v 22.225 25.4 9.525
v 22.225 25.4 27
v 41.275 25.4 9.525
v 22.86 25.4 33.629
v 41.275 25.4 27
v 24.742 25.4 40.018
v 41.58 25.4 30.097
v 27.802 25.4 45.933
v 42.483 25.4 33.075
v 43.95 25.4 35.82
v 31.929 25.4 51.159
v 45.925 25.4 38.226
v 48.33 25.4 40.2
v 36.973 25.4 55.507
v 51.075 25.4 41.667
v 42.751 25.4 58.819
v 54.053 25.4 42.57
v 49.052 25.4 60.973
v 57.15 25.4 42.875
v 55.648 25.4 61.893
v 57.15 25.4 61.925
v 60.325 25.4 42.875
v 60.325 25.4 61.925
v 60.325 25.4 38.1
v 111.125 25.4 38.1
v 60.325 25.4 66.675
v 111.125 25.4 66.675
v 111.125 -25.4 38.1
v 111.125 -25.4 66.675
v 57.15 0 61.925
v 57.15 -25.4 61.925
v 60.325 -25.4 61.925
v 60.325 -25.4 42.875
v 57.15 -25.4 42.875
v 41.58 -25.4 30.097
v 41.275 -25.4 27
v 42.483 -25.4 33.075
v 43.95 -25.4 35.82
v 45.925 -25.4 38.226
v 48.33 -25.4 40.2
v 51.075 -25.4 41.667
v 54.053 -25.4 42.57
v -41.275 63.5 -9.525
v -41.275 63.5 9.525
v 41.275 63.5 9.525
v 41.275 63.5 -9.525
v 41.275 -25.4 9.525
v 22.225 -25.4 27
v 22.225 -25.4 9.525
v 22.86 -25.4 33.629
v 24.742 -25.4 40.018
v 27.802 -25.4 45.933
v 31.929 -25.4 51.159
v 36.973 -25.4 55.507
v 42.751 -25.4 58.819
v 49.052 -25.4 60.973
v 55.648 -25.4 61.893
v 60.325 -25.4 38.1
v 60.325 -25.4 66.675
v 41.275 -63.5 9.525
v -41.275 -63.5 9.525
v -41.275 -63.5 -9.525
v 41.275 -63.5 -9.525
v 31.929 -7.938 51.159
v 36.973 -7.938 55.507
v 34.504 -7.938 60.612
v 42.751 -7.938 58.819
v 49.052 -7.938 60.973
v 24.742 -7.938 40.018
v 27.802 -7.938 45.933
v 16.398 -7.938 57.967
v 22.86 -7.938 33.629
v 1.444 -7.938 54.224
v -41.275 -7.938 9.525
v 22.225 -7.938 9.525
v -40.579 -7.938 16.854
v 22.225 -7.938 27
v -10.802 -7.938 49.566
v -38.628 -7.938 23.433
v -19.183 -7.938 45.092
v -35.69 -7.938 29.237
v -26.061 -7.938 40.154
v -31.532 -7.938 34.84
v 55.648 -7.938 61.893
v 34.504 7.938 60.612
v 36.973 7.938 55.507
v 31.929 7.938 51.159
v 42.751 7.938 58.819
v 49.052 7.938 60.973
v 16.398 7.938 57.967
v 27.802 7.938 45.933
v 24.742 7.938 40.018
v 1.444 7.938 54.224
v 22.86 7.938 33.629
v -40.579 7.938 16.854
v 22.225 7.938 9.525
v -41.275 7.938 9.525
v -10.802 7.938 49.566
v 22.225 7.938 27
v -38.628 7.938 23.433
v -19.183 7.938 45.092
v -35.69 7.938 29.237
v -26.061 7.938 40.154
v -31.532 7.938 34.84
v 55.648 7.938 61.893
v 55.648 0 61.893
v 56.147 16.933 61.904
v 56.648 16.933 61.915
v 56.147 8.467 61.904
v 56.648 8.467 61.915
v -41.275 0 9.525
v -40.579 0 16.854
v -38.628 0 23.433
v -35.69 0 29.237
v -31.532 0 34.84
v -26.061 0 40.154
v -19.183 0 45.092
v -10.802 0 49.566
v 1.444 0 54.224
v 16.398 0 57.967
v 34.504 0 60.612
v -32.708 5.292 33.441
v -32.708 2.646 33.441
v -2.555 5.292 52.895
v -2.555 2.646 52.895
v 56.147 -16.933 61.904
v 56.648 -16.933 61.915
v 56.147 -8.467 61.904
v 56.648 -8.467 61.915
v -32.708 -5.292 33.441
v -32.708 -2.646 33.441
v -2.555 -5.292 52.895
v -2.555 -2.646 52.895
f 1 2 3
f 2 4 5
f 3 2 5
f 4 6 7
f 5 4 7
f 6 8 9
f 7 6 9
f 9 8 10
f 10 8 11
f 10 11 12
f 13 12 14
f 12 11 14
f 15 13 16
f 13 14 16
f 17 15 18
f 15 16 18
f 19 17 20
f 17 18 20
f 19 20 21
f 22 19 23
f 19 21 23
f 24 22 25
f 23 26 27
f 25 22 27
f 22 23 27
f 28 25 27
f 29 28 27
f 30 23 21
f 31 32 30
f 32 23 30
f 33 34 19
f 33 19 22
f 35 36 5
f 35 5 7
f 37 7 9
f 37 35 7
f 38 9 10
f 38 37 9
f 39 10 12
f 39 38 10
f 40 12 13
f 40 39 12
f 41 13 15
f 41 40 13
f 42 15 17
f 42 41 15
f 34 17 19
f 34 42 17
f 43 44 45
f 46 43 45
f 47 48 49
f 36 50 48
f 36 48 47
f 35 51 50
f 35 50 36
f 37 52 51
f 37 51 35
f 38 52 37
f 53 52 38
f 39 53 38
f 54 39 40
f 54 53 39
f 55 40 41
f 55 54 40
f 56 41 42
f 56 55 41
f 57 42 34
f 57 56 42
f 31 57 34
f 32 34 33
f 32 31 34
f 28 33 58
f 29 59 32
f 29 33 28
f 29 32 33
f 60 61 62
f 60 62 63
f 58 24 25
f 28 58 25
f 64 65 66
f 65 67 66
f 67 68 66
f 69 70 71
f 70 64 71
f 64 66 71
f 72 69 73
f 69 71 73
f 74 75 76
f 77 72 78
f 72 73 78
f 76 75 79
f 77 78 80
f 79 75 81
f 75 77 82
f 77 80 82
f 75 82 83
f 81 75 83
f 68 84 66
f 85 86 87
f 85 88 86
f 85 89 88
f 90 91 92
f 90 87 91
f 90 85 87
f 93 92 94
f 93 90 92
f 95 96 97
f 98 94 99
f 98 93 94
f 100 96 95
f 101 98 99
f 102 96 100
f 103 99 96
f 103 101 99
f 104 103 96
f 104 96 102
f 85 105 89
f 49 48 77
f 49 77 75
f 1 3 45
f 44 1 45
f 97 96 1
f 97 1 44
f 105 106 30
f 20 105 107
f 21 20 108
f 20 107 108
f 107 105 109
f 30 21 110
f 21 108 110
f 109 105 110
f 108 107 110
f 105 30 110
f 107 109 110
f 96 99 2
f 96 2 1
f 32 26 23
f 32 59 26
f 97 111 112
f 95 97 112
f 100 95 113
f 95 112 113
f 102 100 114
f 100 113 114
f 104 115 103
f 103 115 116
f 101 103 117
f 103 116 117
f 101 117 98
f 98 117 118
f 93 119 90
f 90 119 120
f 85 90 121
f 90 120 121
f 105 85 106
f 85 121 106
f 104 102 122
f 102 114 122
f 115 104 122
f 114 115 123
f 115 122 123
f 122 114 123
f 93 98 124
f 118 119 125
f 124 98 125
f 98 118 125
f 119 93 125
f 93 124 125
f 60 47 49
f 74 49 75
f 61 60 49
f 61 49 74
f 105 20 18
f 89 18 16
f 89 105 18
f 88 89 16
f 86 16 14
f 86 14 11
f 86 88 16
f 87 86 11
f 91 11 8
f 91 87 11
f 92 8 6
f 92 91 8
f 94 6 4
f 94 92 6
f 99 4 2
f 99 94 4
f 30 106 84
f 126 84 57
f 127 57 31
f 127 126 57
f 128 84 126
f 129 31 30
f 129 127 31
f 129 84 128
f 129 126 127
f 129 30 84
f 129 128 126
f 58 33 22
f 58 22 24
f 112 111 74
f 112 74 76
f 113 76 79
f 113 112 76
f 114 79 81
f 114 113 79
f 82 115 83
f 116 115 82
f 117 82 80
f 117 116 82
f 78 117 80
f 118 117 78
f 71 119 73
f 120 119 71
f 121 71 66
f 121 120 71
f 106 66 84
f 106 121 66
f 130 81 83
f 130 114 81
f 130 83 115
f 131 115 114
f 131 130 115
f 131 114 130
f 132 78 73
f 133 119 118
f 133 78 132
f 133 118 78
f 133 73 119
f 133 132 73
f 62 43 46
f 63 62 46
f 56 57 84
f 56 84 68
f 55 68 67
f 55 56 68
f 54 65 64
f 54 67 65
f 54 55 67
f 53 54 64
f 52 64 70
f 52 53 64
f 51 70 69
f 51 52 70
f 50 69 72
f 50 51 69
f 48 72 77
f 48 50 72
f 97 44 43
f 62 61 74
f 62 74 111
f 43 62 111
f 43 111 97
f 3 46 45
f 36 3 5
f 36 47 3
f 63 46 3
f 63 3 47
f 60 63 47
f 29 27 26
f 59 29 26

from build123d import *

# Parameters (mm, degrees)
F1_DEPTH = 63.5
F2_DEPTH = 25.4
F3_DEPTH = 7.9375


with BuildPart() as f1:
    # F0 (on Front) → F1 (new body, symmetric)
    with BuildSketch(Plane.XZ):
        Polygon((22.225, 9.525), (-41.275, 9.525), (-41.275, -9.525), (41.275, -9.525), (41.275, 9.525), align=None)
    extrude(amount=F1_DEPTH, both=True)

    # F0 (on Front) → F2 (join, symmetric)
    with BuildSketch(Plane.XZ):
        Polygon((60.325, 66.675), (60.325, 61.9252), (60.325, 42.8752), (60.325, 38.1), (111.125, 38.1), (111.125, 66.675), align=None)
        with BuildLine():
            Line((22.225, 27.0002), (22.225, 9.525))
            Line((22.225, 9.525), (41.275, 9.525))
            Line((41.275, 9.525), (41.275, 27.0002))
            ThreePointArc((41.275, 27.0002), (45.92468, 38.22552), (57.15, 42.8752))
            Line((57.15, 42.8752), (60.325, 42.8752))
            Line((60.325, 42.8752), (60.325, 61.9252))
            Line((60.325, 61.9252), (57.15, 61.9252))
            add(Edge.make_bspline(
                [(55.648092, 61.892891), (56.146402, 61.904771), (56.647035, 61.915543), (57.15, 61.9252)],
                knots=[110.762512, 110.762512, 110.762512, 110.762512, 111.504536, 111.504536, 111.504536, 111.504536], degree=3))
            ThreePointArc((55.648092, 61.892891), (31.92888, 51.159065), (22.225, 27.0002))
        make_face()
    extrude(amount=F2_DEPTH, both=True)

    # F0 (on Front) → F3 (join, symmetric)
    with BuildSketch(Plane.XZ):
        with BuildLine():
            add(Edge.make_bspline(
                [(-41.275, 9.525), (-41.346803, 33.675018), (-18.734938, 60.119621), (55.648092, 61.892891)],
                knots=[0, 0, 0, 0, 110.762512, 110.762512, 110.762512, 110.762512], degree=3))
            Line((-41.275, 9.525), (22.225, 9.525))
            Line((22.225, 9.525), (22.225, 27.0002))
            ThreePointArc((22.225, 27.0002), (31.92888, 51.159065), (55.648092, 61.892891))
        make_face()
    extrude(amount=F3_DEPTH, both=True)


solid = f1.part
